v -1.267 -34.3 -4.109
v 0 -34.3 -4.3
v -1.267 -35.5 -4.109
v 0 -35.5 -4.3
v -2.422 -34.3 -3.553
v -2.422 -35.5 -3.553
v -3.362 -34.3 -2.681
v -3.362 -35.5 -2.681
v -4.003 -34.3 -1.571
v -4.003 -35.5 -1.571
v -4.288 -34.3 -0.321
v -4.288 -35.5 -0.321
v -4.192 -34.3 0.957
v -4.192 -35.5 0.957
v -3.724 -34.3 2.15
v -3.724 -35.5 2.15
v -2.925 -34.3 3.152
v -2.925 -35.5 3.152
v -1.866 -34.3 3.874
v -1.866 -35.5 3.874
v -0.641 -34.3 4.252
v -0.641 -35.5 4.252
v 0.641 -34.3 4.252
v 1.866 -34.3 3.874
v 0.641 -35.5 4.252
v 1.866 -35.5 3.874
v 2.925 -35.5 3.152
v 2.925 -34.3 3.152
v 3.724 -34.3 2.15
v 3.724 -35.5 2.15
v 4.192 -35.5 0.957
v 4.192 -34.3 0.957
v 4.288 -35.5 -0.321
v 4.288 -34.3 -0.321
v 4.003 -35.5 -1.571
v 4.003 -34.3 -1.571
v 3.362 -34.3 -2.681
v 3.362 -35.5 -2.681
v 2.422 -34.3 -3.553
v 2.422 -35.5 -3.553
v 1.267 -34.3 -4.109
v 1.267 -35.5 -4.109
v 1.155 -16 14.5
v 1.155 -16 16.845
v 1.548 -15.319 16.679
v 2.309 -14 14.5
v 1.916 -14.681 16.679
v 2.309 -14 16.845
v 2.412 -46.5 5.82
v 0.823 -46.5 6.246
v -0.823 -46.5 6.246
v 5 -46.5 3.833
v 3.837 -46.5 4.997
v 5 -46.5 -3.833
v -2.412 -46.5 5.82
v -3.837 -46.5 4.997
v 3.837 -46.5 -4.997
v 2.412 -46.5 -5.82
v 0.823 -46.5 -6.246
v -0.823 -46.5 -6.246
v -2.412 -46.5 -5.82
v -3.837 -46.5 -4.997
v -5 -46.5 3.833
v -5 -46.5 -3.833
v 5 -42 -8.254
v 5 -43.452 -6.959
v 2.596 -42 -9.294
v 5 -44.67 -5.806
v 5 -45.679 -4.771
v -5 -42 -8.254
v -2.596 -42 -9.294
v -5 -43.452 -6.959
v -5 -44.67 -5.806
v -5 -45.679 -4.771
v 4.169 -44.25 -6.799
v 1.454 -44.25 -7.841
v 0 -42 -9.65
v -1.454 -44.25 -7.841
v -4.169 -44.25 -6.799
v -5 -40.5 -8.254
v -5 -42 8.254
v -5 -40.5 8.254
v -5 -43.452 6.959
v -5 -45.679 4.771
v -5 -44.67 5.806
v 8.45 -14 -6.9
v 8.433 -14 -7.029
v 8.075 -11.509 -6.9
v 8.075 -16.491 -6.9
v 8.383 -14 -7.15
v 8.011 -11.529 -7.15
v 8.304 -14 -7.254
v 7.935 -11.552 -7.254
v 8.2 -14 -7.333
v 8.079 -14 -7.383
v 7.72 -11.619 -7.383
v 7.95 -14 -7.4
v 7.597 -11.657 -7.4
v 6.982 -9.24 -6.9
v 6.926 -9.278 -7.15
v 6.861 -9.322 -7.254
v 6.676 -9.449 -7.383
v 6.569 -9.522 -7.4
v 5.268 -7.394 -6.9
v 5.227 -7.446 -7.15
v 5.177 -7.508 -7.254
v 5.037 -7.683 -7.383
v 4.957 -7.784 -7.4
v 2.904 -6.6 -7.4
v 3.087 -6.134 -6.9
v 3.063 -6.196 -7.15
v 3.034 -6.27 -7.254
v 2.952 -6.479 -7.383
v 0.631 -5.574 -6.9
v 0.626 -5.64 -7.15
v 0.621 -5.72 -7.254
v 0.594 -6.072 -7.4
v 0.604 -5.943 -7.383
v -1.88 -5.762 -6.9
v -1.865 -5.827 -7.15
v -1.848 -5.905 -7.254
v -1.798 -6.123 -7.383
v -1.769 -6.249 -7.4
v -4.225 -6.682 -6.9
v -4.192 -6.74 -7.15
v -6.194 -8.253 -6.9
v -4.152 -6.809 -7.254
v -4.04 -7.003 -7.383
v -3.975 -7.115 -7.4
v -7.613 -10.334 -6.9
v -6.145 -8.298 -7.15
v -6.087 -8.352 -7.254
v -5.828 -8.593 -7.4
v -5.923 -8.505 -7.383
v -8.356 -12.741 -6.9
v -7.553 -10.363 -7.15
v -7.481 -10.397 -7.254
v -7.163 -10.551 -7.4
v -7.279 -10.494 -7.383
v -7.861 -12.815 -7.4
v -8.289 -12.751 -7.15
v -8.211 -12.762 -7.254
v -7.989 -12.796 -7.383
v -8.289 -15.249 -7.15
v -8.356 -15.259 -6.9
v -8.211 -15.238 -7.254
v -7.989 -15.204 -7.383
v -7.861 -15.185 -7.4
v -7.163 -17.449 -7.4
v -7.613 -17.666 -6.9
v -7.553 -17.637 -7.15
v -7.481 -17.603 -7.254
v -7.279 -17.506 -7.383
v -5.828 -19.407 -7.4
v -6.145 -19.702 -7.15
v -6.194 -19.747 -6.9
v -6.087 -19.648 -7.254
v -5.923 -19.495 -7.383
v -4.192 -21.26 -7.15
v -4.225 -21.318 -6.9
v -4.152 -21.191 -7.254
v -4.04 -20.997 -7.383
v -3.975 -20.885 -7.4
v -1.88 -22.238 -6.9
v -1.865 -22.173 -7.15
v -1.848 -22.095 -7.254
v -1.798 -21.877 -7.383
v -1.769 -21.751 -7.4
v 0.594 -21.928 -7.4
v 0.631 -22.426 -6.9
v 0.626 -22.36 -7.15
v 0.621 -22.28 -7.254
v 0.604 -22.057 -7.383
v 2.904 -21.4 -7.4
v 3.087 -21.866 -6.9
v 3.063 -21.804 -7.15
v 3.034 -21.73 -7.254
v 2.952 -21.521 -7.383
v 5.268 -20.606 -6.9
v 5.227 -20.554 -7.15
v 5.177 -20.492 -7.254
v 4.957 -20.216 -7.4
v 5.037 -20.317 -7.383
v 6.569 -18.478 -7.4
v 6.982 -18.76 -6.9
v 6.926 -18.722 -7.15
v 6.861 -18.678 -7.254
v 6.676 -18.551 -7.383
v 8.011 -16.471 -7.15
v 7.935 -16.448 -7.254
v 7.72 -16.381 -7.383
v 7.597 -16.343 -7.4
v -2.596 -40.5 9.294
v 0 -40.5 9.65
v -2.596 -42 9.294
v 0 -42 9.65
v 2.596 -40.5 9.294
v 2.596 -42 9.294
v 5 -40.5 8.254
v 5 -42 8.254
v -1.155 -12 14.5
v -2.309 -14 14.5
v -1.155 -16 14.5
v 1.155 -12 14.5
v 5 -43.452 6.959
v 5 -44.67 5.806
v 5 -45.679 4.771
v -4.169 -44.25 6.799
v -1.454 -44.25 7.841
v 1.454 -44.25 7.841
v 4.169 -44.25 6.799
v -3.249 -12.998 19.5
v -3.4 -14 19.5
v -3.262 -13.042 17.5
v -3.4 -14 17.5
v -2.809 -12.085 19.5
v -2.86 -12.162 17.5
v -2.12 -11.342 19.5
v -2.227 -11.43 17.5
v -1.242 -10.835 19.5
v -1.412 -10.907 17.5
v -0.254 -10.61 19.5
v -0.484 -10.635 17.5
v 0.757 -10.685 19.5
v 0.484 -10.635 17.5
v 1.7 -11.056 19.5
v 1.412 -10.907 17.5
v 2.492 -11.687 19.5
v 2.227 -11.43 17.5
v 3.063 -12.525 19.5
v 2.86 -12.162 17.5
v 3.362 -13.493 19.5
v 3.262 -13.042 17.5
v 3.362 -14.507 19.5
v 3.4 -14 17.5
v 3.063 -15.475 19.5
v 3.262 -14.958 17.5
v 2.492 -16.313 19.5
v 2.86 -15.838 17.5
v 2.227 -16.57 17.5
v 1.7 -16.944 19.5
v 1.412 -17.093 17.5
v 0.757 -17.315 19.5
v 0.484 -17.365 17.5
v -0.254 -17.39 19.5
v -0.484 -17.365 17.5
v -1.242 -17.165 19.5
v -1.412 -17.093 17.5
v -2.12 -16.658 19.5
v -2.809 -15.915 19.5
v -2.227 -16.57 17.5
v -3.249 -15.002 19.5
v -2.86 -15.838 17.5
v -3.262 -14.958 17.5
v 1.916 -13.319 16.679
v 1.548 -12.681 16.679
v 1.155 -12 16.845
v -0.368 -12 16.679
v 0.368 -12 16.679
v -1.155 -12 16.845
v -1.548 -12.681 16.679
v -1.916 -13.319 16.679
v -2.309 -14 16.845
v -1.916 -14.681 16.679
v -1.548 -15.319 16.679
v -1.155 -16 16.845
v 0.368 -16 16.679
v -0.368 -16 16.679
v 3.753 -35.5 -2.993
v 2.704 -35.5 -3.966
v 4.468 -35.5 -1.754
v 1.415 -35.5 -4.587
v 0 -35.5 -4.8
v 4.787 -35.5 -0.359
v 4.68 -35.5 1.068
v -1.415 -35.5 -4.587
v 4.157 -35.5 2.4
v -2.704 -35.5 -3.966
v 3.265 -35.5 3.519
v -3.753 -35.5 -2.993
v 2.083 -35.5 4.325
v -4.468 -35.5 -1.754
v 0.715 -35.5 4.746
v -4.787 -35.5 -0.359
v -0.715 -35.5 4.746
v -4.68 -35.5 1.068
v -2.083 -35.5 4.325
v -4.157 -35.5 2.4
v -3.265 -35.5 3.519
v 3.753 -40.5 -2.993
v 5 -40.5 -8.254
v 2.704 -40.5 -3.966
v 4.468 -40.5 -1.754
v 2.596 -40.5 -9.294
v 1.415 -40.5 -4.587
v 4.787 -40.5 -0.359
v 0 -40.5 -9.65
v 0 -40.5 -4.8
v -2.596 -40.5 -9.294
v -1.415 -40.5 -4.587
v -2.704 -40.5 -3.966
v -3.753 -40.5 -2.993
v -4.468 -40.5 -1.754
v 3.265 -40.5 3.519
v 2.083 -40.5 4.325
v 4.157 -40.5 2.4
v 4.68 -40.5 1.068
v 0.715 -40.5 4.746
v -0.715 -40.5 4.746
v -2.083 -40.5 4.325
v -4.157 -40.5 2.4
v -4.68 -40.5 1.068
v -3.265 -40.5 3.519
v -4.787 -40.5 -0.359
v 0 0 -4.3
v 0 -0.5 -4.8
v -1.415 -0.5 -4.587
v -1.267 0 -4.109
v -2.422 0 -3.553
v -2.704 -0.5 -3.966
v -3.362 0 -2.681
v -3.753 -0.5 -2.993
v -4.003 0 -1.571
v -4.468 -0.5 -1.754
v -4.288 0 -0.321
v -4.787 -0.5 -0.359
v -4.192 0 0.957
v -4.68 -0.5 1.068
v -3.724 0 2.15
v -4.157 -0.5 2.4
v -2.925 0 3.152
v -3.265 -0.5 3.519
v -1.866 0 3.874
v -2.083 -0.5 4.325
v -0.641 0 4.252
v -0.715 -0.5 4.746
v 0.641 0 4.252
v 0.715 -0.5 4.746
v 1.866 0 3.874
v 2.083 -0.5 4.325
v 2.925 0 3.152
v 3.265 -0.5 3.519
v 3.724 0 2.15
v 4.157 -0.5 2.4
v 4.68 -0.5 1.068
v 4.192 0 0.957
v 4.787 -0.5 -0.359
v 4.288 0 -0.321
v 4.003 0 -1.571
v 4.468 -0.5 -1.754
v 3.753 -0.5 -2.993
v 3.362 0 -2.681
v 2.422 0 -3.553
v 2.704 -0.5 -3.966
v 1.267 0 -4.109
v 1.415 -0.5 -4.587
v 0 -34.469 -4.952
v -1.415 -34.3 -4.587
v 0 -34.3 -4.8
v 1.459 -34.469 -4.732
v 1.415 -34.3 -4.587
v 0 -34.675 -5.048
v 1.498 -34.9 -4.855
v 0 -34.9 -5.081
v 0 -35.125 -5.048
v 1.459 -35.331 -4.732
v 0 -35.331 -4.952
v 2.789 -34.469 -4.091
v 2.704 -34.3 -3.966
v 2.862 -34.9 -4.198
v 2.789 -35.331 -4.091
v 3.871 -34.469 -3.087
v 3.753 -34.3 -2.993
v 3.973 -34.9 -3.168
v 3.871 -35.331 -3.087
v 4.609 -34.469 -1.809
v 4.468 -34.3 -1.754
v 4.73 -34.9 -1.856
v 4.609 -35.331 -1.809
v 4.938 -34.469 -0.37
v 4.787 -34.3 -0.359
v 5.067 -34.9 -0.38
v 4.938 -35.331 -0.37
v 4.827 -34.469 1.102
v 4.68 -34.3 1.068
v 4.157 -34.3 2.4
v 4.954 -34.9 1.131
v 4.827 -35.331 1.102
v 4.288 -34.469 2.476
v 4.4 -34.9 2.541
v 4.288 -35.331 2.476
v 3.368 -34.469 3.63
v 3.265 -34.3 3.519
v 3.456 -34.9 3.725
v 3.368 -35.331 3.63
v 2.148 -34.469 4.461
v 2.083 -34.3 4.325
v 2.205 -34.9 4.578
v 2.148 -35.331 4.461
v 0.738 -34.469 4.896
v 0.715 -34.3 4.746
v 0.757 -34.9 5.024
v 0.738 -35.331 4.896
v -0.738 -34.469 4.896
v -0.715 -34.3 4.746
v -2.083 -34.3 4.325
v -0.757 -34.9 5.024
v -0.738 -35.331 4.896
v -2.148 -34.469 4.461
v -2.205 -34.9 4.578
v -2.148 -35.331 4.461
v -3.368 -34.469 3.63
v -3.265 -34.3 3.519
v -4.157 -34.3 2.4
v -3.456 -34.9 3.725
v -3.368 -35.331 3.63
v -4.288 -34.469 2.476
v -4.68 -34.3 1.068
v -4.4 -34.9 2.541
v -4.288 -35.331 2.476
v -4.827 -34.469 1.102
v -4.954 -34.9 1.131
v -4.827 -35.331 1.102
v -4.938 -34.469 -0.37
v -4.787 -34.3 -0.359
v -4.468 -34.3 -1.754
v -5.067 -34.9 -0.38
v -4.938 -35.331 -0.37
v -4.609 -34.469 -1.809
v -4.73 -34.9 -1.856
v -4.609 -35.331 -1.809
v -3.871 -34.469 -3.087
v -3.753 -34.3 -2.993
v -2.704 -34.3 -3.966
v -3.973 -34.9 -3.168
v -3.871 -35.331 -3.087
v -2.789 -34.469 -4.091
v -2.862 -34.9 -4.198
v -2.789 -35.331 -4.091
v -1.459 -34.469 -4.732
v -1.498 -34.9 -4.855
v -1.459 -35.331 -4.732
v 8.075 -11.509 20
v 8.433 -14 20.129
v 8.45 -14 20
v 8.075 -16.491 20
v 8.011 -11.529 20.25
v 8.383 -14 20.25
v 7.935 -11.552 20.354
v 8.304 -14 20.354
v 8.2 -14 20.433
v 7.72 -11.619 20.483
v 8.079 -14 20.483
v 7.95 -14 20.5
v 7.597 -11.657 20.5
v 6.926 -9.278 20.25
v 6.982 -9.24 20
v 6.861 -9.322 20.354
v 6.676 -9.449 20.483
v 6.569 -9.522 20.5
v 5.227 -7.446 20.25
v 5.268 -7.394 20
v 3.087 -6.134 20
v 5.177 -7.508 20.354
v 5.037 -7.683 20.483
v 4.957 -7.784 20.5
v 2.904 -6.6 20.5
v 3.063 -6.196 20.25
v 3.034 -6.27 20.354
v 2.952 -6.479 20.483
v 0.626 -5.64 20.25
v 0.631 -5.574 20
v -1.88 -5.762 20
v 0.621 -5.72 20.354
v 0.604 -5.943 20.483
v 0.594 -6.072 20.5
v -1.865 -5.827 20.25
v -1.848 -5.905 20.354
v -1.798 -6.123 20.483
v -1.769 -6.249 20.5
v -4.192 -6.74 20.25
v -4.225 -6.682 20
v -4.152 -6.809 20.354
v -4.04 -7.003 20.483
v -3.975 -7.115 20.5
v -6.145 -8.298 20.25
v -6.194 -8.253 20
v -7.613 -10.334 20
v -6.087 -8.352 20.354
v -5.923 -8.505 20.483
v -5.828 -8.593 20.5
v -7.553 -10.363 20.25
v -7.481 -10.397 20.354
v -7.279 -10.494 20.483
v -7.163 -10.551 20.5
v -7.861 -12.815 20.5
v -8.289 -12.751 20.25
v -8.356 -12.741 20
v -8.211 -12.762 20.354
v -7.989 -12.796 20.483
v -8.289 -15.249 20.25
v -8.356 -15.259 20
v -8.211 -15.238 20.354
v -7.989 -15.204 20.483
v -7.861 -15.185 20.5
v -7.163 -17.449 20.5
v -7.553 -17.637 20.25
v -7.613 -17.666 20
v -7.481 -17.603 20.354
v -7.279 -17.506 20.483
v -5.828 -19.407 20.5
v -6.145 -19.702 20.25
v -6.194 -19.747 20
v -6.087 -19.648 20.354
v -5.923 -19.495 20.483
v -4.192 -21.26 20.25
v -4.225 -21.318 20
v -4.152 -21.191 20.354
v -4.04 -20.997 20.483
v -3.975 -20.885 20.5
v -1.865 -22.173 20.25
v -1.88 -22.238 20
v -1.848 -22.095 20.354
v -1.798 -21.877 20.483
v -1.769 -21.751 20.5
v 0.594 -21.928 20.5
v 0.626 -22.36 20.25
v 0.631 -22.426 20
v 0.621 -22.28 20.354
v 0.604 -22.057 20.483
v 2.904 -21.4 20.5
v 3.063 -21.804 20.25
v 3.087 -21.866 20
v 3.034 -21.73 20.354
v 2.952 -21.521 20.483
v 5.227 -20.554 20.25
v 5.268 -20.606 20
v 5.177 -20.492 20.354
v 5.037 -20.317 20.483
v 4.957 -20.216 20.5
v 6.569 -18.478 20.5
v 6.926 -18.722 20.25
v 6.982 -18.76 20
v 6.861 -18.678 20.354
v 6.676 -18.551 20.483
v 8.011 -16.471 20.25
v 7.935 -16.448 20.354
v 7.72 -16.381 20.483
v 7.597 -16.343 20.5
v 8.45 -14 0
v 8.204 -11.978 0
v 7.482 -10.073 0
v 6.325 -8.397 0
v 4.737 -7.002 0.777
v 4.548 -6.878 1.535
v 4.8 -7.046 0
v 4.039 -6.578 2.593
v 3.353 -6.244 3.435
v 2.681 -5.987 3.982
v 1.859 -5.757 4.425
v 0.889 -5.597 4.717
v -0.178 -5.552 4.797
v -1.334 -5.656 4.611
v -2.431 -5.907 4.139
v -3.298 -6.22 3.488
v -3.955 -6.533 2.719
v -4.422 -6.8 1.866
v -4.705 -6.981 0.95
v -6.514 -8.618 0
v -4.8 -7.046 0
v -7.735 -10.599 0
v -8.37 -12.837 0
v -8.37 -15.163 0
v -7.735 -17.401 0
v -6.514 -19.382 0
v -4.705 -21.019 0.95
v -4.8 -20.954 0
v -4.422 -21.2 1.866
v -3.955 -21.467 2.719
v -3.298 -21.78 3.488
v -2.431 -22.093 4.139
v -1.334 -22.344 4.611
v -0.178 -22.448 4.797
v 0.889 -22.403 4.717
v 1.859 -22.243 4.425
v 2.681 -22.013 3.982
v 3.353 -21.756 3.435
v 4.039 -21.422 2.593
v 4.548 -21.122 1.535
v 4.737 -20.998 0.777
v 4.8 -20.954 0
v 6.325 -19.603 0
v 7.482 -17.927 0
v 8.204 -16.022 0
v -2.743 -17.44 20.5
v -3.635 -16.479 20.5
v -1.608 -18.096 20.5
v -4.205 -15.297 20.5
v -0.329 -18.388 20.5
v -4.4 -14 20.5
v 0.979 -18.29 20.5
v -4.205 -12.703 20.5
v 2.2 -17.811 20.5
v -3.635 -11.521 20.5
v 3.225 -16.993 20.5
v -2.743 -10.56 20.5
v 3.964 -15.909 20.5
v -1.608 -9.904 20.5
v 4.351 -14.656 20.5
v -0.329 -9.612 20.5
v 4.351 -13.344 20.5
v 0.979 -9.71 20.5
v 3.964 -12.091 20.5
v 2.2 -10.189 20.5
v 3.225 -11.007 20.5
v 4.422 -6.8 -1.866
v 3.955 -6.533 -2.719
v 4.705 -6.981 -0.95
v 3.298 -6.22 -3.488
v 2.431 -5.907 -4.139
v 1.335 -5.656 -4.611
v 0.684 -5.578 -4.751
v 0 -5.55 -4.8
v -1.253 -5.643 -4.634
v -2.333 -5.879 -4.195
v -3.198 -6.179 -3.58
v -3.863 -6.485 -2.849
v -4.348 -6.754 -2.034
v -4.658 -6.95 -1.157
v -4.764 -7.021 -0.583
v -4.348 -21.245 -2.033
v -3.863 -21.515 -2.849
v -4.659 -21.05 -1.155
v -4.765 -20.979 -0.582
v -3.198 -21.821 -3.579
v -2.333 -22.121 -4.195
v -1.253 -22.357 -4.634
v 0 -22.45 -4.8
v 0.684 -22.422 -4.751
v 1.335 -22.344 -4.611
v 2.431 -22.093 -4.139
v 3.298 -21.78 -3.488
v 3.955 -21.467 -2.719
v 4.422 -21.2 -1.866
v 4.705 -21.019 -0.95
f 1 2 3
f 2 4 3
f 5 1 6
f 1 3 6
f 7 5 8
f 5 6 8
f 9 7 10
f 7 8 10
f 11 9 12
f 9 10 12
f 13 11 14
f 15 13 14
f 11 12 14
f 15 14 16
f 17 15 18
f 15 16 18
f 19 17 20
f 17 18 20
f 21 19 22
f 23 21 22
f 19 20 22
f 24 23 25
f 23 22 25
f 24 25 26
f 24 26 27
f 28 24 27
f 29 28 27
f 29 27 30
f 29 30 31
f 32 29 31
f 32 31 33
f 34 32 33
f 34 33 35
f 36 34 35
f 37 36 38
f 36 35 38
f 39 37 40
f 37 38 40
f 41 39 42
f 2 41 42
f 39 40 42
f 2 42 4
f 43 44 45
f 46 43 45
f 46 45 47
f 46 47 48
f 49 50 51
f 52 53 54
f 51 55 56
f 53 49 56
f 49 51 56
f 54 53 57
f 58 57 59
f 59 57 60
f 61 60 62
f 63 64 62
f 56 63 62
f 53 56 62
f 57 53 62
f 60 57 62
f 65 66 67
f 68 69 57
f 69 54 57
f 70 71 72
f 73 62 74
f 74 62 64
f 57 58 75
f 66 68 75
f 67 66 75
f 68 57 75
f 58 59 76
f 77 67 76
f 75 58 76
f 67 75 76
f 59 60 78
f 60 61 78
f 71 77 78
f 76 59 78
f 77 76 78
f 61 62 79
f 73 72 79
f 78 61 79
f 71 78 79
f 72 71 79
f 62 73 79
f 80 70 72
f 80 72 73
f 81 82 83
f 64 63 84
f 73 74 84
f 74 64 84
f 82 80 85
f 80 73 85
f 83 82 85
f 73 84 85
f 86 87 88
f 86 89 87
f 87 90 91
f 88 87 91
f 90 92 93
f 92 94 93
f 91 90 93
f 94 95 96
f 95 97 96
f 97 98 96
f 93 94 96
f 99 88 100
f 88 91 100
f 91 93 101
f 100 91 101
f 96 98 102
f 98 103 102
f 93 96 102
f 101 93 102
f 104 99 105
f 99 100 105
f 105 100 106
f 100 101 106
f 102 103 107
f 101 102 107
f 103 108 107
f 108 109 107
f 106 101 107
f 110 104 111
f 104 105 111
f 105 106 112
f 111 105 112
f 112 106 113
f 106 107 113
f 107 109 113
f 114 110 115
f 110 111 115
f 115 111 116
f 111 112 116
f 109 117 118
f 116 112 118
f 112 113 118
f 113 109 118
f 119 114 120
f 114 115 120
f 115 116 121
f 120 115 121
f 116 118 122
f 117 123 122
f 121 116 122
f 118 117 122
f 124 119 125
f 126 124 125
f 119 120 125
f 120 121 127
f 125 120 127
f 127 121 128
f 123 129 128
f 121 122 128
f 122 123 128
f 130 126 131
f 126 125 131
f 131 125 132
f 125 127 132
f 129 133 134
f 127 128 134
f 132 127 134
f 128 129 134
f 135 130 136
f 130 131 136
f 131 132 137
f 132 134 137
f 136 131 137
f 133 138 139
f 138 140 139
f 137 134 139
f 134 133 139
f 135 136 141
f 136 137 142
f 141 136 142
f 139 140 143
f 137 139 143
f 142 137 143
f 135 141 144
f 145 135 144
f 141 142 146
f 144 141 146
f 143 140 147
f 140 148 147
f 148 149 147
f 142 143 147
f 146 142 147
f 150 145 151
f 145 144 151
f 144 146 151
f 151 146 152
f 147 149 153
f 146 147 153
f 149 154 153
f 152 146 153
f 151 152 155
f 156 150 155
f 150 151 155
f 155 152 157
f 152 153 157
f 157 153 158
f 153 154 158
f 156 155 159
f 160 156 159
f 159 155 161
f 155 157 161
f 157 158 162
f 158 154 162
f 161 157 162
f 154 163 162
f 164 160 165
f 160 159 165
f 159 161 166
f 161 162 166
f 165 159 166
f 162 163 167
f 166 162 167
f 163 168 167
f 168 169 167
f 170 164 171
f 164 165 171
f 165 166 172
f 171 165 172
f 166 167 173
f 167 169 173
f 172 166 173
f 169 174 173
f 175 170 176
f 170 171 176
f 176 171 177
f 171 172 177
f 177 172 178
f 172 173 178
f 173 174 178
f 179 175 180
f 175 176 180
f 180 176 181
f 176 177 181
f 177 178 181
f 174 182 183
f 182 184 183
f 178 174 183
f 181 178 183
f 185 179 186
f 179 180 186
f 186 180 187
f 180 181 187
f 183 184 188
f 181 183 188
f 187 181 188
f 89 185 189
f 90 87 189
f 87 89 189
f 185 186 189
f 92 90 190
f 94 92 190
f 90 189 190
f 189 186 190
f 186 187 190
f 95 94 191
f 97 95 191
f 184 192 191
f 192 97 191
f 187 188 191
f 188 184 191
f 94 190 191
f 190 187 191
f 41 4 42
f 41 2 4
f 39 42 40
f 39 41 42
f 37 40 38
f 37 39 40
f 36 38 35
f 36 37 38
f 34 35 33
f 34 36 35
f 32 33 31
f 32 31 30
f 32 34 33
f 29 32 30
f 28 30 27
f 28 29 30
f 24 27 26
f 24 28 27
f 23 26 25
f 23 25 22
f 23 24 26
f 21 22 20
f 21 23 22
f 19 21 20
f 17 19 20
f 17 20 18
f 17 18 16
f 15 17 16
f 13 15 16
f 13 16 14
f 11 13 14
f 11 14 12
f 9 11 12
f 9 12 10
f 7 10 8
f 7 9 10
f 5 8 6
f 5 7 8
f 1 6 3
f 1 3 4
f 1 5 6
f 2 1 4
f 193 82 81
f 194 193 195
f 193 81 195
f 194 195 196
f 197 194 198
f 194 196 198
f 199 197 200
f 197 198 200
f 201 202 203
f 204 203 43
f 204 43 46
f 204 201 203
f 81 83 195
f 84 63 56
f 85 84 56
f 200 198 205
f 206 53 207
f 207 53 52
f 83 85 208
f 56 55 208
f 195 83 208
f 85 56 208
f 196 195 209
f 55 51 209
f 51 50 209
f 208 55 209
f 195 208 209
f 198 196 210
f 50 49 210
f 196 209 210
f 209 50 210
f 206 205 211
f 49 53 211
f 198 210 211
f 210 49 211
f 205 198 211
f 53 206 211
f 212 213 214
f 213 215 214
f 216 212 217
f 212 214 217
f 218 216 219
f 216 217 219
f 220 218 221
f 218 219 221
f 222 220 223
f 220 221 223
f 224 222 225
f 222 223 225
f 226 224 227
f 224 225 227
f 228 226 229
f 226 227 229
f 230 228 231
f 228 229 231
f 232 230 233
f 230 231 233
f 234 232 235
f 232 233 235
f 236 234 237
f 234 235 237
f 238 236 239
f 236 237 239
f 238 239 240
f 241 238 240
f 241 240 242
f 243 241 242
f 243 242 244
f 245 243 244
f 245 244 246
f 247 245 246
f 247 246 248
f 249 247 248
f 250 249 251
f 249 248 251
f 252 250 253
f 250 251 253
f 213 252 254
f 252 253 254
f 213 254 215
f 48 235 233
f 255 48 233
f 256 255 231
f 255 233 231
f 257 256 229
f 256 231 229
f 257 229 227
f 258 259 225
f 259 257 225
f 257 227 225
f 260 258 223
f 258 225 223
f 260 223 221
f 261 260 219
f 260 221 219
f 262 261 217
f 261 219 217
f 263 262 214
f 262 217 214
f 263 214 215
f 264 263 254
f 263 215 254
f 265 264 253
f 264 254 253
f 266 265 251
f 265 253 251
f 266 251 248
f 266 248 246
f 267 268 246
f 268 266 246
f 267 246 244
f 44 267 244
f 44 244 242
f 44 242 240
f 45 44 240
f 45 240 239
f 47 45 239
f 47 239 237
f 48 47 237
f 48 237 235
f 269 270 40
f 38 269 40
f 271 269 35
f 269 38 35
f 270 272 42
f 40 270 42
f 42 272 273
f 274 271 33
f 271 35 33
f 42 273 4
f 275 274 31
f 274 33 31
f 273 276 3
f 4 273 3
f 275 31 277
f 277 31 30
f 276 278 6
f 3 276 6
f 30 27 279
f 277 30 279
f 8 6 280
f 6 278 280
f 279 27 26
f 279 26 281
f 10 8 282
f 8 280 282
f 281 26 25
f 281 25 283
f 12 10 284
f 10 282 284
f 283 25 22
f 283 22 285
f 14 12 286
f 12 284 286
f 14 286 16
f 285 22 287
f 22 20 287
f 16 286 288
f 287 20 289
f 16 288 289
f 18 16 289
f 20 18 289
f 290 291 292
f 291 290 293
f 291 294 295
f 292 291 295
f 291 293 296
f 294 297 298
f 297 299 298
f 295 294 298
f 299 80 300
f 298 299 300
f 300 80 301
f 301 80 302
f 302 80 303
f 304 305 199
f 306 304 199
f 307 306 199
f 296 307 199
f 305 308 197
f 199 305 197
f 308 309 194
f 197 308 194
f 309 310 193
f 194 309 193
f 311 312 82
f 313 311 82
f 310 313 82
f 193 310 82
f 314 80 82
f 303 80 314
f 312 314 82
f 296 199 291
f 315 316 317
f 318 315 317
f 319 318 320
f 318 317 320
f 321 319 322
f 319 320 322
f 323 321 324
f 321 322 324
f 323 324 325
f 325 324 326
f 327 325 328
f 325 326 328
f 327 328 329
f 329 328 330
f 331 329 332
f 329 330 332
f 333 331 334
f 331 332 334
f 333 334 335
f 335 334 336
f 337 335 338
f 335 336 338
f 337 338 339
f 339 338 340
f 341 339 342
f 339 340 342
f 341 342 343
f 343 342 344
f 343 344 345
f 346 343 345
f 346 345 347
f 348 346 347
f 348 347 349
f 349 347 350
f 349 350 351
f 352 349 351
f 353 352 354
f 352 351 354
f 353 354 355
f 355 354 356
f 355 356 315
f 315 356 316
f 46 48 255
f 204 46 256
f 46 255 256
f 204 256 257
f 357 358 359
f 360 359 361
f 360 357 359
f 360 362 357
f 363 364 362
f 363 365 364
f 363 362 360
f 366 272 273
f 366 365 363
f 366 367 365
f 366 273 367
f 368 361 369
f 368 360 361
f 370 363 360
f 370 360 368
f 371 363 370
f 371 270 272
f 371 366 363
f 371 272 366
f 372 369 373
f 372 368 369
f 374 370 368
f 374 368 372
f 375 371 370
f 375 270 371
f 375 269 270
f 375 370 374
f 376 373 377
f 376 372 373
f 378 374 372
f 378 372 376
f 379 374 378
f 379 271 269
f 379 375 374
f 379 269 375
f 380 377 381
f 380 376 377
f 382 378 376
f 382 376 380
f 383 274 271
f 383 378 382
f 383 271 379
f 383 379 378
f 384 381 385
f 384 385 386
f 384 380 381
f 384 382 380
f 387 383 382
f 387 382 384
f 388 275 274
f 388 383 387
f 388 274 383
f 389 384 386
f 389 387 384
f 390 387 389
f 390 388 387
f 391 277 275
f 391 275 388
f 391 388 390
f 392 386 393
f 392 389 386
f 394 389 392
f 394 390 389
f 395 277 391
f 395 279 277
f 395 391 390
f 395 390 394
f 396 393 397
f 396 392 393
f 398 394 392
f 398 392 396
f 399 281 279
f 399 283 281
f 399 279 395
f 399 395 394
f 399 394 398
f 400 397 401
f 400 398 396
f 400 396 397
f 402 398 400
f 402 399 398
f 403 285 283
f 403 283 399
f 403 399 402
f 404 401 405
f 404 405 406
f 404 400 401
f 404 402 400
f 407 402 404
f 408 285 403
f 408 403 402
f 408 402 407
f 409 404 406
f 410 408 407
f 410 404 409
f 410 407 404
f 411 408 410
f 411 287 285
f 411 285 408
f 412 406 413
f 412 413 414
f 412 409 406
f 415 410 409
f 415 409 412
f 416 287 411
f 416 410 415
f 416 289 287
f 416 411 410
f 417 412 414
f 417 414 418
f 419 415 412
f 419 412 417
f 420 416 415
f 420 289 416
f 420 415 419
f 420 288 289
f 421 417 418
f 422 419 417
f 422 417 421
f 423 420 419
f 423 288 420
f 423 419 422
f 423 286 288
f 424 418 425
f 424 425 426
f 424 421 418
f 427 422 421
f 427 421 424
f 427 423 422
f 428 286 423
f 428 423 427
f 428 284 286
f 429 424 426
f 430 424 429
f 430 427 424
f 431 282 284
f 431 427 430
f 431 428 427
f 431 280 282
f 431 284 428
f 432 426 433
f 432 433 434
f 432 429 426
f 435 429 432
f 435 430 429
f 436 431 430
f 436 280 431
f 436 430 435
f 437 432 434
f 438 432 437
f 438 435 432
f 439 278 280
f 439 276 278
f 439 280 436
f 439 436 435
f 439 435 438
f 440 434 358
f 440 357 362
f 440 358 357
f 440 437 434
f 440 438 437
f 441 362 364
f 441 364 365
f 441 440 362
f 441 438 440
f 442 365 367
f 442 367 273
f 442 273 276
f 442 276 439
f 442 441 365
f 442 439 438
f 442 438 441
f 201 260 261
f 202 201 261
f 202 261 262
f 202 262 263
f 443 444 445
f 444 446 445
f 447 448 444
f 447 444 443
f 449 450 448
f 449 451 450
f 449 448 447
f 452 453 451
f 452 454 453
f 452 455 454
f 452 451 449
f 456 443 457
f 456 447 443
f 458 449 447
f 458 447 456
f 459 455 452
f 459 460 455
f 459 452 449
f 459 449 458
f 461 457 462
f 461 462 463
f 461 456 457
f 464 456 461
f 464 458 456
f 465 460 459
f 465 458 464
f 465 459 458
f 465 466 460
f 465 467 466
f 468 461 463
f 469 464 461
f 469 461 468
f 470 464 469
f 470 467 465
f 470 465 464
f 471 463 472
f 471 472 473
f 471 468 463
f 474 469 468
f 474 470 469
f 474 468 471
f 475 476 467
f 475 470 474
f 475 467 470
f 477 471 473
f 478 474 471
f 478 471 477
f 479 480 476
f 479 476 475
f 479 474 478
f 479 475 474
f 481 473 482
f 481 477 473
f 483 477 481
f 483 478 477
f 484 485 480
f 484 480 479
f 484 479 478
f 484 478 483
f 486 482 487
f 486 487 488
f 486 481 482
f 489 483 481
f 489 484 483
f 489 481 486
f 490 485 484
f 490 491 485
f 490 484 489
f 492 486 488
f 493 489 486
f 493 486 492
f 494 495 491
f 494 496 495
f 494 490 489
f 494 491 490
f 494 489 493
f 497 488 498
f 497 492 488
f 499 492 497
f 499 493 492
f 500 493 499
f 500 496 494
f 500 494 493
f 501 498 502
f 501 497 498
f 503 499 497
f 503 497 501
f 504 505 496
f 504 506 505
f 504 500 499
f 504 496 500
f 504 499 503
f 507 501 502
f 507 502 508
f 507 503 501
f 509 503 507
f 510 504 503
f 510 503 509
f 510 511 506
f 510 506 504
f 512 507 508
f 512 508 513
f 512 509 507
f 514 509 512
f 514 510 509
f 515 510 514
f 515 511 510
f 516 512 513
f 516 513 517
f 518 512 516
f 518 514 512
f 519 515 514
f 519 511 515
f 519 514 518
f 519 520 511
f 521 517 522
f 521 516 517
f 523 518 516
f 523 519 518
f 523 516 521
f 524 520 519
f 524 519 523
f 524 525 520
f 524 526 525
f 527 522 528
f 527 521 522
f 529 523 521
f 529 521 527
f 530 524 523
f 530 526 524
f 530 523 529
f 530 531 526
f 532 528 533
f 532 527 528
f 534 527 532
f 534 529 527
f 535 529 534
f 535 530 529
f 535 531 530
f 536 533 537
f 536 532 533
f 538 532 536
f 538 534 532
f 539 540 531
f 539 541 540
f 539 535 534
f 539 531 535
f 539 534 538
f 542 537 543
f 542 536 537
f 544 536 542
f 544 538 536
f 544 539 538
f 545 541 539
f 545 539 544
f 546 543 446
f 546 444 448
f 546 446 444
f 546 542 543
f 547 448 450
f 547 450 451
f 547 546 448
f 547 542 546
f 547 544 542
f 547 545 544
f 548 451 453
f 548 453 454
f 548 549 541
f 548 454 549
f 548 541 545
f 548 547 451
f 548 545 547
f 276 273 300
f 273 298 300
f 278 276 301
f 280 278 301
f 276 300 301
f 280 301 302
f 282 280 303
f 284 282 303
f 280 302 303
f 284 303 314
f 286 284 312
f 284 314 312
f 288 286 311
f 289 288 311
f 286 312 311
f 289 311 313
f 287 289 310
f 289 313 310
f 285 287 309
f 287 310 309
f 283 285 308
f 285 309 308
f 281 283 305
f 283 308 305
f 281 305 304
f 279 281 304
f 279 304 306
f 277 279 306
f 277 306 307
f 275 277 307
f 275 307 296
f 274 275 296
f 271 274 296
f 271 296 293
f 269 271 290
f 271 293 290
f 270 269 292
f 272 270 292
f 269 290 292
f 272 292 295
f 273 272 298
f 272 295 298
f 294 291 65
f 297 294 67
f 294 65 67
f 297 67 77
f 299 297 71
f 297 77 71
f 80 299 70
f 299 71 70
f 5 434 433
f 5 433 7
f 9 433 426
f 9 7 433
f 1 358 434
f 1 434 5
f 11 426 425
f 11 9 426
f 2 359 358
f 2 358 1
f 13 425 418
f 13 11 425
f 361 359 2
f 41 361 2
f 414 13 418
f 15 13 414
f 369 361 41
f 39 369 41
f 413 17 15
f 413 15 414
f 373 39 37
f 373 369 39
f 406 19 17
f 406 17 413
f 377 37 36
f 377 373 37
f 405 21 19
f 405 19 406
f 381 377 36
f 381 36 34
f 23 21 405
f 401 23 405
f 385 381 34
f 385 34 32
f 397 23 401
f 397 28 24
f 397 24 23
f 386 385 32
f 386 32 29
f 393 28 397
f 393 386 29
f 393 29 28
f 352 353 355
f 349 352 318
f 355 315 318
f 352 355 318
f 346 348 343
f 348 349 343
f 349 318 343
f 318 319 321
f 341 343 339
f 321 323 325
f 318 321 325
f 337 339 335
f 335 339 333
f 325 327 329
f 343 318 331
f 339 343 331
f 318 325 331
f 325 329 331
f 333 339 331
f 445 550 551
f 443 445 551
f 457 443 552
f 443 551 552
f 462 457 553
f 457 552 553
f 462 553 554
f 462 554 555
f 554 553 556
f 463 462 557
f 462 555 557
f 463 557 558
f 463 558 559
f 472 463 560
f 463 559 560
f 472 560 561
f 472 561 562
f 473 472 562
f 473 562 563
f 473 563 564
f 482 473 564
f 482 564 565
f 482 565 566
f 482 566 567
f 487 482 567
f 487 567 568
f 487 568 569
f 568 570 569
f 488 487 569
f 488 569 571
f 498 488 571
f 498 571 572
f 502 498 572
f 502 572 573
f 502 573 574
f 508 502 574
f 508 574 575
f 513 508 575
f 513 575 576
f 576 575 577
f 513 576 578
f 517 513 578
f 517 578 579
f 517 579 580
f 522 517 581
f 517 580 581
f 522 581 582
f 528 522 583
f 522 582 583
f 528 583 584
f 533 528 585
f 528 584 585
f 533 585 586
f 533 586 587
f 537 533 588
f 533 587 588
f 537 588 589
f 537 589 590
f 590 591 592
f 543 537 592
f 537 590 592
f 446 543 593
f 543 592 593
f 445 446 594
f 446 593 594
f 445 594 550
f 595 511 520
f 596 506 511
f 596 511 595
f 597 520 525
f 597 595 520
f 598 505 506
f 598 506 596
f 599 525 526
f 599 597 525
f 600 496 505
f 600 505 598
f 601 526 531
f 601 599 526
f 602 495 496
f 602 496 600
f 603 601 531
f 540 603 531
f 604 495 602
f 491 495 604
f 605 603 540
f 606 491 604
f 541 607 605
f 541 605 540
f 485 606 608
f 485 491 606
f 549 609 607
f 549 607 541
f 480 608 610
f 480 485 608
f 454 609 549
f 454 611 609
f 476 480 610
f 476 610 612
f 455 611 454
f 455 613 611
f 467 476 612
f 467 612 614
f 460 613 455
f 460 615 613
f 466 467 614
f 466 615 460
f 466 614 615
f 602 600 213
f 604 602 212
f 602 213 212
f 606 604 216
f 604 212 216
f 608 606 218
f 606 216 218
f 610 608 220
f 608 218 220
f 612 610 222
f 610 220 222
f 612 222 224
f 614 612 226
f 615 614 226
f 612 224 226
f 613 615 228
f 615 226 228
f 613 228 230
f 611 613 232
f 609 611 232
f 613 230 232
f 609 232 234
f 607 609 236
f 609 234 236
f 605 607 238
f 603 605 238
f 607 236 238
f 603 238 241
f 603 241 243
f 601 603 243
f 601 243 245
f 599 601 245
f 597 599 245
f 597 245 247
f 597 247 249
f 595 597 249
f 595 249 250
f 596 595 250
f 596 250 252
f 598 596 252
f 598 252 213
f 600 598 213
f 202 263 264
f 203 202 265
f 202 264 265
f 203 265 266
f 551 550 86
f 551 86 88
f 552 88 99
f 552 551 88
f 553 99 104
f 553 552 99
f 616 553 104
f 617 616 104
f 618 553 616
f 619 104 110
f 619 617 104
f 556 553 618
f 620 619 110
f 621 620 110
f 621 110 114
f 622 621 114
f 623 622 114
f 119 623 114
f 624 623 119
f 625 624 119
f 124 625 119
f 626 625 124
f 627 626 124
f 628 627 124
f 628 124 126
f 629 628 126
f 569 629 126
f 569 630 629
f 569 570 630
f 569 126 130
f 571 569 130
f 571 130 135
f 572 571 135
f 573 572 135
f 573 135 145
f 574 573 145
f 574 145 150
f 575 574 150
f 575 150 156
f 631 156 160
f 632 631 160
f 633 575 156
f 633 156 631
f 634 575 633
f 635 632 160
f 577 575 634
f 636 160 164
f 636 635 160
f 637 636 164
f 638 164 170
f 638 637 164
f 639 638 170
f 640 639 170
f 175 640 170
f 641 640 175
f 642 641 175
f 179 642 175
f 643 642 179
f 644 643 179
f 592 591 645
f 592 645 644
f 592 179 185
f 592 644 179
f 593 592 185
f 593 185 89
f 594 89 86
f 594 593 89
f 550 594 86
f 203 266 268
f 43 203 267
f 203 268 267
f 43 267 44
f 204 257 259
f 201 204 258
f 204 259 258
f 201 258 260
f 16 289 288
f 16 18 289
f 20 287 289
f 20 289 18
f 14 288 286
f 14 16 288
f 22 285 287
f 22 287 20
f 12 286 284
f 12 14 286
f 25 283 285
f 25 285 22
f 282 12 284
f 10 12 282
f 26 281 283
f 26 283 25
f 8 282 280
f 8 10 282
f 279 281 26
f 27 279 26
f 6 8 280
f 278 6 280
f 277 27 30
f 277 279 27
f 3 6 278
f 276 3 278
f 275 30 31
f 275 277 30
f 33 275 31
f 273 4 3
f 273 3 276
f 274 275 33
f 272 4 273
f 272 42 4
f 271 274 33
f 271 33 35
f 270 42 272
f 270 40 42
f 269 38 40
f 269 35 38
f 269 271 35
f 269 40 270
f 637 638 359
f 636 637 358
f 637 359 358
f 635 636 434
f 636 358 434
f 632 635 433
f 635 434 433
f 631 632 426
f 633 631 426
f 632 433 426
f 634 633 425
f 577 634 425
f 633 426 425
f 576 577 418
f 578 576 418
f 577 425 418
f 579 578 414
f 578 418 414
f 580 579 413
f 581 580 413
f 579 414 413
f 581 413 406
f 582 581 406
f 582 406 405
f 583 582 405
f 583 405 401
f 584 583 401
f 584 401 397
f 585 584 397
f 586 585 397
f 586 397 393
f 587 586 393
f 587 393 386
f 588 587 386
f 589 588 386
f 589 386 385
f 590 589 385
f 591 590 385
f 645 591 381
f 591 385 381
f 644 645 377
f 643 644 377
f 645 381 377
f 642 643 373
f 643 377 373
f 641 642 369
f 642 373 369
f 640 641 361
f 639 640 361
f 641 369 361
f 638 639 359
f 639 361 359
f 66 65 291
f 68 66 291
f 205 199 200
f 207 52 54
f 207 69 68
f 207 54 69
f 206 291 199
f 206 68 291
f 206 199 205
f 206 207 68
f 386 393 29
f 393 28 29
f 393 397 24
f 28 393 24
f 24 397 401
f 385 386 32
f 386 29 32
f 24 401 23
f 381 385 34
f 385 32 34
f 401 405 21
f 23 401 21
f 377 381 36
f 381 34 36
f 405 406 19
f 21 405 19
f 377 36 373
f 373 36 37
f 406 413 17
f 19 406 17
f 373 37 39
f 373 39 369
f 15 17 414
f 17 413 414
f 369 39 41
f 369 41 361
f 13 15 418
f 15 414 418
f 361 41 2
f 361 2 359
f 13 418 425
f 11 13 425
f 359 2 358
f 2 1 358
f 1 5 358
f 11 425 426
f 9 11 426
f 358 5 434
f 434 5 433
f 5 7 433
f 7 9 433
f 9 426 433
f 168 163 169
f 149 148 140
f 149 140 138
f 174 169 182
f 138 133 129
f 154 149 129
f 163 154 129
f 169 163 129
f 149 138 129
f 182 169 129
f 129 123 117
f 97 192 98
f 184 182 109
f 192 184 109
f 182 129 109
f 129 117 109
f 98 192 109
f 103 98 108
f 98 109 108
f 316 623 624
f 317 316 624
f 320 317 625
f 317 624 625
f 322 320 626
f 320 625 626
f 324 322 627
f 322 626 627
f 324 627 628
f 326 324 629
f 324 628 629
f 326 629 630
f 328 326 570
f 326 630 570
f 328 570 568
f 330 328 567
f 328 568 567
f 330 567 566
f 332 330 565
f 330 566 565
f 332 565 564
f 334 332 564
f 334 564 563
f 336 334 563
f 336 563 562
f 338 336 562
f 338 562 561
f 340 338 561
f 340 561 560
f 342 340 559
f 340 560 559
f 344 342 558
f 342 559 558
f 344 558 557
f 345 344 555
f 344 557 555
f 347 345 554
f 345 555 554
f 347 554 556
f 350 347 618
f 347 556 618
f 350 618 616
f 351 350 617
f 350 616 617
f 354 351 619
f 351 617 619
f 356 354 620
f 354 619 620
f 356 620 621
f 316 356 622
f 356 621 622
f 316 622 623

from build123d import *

# Parameters (mm, degrees)
SKETCH_6_OUTSIDE_W          = 32.084
SKETCH_6_OUTSIDE_H          = 32.084
SKETCH_6_OUTSIDE_W_2        = 10
SKETCH_6_OUTSIDE_H_2        = 19.3
CUT_EXTRUDE_1_DEPTH         = 6
CHAMFER_1_SIZE              = 0.5
SKETCH_12_R                 = 8.45
EXTRUDE_2_DEPTH             = 20.5
EXTRUDE_2_DEPTH_BACK        = 7.4
HOLE_WIZARD_M81_D           = 6.8
HOLE_WIZARD_M81_DEPTH       = 3
HOLE_WIZARD_M81_CSINK_D     = 8.8
HOLE_WIZARD_M81_CSINK_ANGLE = 90
HOLE_WIZARD_M81_TIP         = 2.042926105
FILLET_1_R                  = 0.5
CUT_EXTRUDE_2_DEPTH         = 6


with BuildPart() as part:
    # Эскиз3 → Повернуть1 (revolve)
    with BuildSketch(Plane.XY, mode=Mode.PRIVATE) as revolve_1_sk:
        Polygon((0, 0), (-4.8, 0), (-4.8, -34.3), (-4.3, -34.3), (-4.3, -35.5), (-4.8, -35.5), (-4.8, -40.5), (-9.65, -40.5), (-9.65, -42), (-6.3, -46.5), (0, -46.5), align=None)
    revolve(revolve_1_sk.sketch.rotate(Axis((0, 0, 0), (0, 1, 0)), 270), axis=Axis((0, 0, 0), (0, 1, 0)))  # turned: the seam where the file's is

    # Эскиз6 outside → Вырез-Вытянуть1 (cut)
    with BuildSketch(Plane.XZ.offset(46.5)):
        Rectangle(SKETCH_6_OUTSIDE_W, SKETCH_6_OUTSIDE_H)
        Rectangle(SKETCH_6_OUTSIDE_W_2, SKETCH_6_OUTSIDE_H_2, mode=Mode.SUBTRACT)
    extrude(amount=-CUT_EXTRUDE_1_DEPTH, mode=Mode.SUBTRACT)

    # Фаска1
    chamfer_1_edges = [part.edges().sort_by_distance(p)[0] for p in [
        (0, 0, 4.8),
    ]]
    chamfer(chamfer_1_edges, length=CHAMFER_1_SIZE)

    # Эскиз12 → Бобышка-Вытянуть2 (add, two sides)
    with BuildSketch(Plane.XY) as extrude_2_sk:
        with Locations((0, -14)):
            Circle(SKETCH_12_R)
    extrude(amount=EXTRUDE_2_DEPTH)
    extrude(extrude_2_sk.sketch, amount=-EXTRUDE_2_DEPTH_BACK)

    # Отверстие обработанное метчиком M81
    with Locations(Plane.XY.offset(20.5)):
        with Locations((0, -14)):
            CounterSinkHole(HOLE_WIZARD_M81_D / 2, HOLE_WIZARD_M81_CSINK_D / 2, depth=HOLE_WIZARD_M81_DEPTH, counter_sink_angle=HOLE_WIZARD_M81_CSINK_ANGLE)
            with Locations((0, 0, -(HOLE_WIZARD_M81_DEPTH + HOLE_WIZARD_M81_TIP / 2))):  # 118° drill point
                Cone(0, HOLE_WIZARD_M81_D / 2, HOLE_WIZARD_M81_TIP, mode=Mode.SUBTRACT)

    # Скругление1
    fillet_1_edges = [part.edges().sort_by_distance(p)[0] for p in [
        (-8.45, -14, -7.4),
        (-8.45, -14, 20.5),
    ]]
    fillet(fillet_1_edges, radius=FILLET_1_R)

    # Эскиз15 → Вырез-Вытянуть2 (cut)
    with BuildSketch(Plane.XY.offset(20.5)):
        Polygon((2.309401077, -14), (1.154700538, -12), (-1.154700538, -12), (-2.309401077, -14), (-1.154700538, -16), (1.154700538, -16), align=None)
    extrude(amount=-CUT_EXTRUDE_2_DEPTH, mode=Mode.SUBTRACT)


with BuildPart() as body_2:
    # Эскиз16 → Повернуть2 (revolve)
    with BuildSketch(Plane.XY, mode=Mode.PRIVATE) as revolve_2_sk:
        with BuildLine():
            Line((-4.3, -34.3), (-4.8, -34.3))
            ThreePointArc((-4.8, -34.3), (-5.081024968, -34.9), (-4.8, -35.5))
            Line((-4.8, -35.5), (-4.3, -35.5))
            Line((-4.3, -35.5), (-4.3, -34.3))
        make_face()
    revolve(revolve_2_sk.sketch.rotate(Axis((0, -34.3, 0), (0, -1, 0)), 90), axis=Axis((0, -34.3, 0), (0, -1, 0)))  # turned: the seam where the file's is


solid = Compound([part.part, body_2.part])
